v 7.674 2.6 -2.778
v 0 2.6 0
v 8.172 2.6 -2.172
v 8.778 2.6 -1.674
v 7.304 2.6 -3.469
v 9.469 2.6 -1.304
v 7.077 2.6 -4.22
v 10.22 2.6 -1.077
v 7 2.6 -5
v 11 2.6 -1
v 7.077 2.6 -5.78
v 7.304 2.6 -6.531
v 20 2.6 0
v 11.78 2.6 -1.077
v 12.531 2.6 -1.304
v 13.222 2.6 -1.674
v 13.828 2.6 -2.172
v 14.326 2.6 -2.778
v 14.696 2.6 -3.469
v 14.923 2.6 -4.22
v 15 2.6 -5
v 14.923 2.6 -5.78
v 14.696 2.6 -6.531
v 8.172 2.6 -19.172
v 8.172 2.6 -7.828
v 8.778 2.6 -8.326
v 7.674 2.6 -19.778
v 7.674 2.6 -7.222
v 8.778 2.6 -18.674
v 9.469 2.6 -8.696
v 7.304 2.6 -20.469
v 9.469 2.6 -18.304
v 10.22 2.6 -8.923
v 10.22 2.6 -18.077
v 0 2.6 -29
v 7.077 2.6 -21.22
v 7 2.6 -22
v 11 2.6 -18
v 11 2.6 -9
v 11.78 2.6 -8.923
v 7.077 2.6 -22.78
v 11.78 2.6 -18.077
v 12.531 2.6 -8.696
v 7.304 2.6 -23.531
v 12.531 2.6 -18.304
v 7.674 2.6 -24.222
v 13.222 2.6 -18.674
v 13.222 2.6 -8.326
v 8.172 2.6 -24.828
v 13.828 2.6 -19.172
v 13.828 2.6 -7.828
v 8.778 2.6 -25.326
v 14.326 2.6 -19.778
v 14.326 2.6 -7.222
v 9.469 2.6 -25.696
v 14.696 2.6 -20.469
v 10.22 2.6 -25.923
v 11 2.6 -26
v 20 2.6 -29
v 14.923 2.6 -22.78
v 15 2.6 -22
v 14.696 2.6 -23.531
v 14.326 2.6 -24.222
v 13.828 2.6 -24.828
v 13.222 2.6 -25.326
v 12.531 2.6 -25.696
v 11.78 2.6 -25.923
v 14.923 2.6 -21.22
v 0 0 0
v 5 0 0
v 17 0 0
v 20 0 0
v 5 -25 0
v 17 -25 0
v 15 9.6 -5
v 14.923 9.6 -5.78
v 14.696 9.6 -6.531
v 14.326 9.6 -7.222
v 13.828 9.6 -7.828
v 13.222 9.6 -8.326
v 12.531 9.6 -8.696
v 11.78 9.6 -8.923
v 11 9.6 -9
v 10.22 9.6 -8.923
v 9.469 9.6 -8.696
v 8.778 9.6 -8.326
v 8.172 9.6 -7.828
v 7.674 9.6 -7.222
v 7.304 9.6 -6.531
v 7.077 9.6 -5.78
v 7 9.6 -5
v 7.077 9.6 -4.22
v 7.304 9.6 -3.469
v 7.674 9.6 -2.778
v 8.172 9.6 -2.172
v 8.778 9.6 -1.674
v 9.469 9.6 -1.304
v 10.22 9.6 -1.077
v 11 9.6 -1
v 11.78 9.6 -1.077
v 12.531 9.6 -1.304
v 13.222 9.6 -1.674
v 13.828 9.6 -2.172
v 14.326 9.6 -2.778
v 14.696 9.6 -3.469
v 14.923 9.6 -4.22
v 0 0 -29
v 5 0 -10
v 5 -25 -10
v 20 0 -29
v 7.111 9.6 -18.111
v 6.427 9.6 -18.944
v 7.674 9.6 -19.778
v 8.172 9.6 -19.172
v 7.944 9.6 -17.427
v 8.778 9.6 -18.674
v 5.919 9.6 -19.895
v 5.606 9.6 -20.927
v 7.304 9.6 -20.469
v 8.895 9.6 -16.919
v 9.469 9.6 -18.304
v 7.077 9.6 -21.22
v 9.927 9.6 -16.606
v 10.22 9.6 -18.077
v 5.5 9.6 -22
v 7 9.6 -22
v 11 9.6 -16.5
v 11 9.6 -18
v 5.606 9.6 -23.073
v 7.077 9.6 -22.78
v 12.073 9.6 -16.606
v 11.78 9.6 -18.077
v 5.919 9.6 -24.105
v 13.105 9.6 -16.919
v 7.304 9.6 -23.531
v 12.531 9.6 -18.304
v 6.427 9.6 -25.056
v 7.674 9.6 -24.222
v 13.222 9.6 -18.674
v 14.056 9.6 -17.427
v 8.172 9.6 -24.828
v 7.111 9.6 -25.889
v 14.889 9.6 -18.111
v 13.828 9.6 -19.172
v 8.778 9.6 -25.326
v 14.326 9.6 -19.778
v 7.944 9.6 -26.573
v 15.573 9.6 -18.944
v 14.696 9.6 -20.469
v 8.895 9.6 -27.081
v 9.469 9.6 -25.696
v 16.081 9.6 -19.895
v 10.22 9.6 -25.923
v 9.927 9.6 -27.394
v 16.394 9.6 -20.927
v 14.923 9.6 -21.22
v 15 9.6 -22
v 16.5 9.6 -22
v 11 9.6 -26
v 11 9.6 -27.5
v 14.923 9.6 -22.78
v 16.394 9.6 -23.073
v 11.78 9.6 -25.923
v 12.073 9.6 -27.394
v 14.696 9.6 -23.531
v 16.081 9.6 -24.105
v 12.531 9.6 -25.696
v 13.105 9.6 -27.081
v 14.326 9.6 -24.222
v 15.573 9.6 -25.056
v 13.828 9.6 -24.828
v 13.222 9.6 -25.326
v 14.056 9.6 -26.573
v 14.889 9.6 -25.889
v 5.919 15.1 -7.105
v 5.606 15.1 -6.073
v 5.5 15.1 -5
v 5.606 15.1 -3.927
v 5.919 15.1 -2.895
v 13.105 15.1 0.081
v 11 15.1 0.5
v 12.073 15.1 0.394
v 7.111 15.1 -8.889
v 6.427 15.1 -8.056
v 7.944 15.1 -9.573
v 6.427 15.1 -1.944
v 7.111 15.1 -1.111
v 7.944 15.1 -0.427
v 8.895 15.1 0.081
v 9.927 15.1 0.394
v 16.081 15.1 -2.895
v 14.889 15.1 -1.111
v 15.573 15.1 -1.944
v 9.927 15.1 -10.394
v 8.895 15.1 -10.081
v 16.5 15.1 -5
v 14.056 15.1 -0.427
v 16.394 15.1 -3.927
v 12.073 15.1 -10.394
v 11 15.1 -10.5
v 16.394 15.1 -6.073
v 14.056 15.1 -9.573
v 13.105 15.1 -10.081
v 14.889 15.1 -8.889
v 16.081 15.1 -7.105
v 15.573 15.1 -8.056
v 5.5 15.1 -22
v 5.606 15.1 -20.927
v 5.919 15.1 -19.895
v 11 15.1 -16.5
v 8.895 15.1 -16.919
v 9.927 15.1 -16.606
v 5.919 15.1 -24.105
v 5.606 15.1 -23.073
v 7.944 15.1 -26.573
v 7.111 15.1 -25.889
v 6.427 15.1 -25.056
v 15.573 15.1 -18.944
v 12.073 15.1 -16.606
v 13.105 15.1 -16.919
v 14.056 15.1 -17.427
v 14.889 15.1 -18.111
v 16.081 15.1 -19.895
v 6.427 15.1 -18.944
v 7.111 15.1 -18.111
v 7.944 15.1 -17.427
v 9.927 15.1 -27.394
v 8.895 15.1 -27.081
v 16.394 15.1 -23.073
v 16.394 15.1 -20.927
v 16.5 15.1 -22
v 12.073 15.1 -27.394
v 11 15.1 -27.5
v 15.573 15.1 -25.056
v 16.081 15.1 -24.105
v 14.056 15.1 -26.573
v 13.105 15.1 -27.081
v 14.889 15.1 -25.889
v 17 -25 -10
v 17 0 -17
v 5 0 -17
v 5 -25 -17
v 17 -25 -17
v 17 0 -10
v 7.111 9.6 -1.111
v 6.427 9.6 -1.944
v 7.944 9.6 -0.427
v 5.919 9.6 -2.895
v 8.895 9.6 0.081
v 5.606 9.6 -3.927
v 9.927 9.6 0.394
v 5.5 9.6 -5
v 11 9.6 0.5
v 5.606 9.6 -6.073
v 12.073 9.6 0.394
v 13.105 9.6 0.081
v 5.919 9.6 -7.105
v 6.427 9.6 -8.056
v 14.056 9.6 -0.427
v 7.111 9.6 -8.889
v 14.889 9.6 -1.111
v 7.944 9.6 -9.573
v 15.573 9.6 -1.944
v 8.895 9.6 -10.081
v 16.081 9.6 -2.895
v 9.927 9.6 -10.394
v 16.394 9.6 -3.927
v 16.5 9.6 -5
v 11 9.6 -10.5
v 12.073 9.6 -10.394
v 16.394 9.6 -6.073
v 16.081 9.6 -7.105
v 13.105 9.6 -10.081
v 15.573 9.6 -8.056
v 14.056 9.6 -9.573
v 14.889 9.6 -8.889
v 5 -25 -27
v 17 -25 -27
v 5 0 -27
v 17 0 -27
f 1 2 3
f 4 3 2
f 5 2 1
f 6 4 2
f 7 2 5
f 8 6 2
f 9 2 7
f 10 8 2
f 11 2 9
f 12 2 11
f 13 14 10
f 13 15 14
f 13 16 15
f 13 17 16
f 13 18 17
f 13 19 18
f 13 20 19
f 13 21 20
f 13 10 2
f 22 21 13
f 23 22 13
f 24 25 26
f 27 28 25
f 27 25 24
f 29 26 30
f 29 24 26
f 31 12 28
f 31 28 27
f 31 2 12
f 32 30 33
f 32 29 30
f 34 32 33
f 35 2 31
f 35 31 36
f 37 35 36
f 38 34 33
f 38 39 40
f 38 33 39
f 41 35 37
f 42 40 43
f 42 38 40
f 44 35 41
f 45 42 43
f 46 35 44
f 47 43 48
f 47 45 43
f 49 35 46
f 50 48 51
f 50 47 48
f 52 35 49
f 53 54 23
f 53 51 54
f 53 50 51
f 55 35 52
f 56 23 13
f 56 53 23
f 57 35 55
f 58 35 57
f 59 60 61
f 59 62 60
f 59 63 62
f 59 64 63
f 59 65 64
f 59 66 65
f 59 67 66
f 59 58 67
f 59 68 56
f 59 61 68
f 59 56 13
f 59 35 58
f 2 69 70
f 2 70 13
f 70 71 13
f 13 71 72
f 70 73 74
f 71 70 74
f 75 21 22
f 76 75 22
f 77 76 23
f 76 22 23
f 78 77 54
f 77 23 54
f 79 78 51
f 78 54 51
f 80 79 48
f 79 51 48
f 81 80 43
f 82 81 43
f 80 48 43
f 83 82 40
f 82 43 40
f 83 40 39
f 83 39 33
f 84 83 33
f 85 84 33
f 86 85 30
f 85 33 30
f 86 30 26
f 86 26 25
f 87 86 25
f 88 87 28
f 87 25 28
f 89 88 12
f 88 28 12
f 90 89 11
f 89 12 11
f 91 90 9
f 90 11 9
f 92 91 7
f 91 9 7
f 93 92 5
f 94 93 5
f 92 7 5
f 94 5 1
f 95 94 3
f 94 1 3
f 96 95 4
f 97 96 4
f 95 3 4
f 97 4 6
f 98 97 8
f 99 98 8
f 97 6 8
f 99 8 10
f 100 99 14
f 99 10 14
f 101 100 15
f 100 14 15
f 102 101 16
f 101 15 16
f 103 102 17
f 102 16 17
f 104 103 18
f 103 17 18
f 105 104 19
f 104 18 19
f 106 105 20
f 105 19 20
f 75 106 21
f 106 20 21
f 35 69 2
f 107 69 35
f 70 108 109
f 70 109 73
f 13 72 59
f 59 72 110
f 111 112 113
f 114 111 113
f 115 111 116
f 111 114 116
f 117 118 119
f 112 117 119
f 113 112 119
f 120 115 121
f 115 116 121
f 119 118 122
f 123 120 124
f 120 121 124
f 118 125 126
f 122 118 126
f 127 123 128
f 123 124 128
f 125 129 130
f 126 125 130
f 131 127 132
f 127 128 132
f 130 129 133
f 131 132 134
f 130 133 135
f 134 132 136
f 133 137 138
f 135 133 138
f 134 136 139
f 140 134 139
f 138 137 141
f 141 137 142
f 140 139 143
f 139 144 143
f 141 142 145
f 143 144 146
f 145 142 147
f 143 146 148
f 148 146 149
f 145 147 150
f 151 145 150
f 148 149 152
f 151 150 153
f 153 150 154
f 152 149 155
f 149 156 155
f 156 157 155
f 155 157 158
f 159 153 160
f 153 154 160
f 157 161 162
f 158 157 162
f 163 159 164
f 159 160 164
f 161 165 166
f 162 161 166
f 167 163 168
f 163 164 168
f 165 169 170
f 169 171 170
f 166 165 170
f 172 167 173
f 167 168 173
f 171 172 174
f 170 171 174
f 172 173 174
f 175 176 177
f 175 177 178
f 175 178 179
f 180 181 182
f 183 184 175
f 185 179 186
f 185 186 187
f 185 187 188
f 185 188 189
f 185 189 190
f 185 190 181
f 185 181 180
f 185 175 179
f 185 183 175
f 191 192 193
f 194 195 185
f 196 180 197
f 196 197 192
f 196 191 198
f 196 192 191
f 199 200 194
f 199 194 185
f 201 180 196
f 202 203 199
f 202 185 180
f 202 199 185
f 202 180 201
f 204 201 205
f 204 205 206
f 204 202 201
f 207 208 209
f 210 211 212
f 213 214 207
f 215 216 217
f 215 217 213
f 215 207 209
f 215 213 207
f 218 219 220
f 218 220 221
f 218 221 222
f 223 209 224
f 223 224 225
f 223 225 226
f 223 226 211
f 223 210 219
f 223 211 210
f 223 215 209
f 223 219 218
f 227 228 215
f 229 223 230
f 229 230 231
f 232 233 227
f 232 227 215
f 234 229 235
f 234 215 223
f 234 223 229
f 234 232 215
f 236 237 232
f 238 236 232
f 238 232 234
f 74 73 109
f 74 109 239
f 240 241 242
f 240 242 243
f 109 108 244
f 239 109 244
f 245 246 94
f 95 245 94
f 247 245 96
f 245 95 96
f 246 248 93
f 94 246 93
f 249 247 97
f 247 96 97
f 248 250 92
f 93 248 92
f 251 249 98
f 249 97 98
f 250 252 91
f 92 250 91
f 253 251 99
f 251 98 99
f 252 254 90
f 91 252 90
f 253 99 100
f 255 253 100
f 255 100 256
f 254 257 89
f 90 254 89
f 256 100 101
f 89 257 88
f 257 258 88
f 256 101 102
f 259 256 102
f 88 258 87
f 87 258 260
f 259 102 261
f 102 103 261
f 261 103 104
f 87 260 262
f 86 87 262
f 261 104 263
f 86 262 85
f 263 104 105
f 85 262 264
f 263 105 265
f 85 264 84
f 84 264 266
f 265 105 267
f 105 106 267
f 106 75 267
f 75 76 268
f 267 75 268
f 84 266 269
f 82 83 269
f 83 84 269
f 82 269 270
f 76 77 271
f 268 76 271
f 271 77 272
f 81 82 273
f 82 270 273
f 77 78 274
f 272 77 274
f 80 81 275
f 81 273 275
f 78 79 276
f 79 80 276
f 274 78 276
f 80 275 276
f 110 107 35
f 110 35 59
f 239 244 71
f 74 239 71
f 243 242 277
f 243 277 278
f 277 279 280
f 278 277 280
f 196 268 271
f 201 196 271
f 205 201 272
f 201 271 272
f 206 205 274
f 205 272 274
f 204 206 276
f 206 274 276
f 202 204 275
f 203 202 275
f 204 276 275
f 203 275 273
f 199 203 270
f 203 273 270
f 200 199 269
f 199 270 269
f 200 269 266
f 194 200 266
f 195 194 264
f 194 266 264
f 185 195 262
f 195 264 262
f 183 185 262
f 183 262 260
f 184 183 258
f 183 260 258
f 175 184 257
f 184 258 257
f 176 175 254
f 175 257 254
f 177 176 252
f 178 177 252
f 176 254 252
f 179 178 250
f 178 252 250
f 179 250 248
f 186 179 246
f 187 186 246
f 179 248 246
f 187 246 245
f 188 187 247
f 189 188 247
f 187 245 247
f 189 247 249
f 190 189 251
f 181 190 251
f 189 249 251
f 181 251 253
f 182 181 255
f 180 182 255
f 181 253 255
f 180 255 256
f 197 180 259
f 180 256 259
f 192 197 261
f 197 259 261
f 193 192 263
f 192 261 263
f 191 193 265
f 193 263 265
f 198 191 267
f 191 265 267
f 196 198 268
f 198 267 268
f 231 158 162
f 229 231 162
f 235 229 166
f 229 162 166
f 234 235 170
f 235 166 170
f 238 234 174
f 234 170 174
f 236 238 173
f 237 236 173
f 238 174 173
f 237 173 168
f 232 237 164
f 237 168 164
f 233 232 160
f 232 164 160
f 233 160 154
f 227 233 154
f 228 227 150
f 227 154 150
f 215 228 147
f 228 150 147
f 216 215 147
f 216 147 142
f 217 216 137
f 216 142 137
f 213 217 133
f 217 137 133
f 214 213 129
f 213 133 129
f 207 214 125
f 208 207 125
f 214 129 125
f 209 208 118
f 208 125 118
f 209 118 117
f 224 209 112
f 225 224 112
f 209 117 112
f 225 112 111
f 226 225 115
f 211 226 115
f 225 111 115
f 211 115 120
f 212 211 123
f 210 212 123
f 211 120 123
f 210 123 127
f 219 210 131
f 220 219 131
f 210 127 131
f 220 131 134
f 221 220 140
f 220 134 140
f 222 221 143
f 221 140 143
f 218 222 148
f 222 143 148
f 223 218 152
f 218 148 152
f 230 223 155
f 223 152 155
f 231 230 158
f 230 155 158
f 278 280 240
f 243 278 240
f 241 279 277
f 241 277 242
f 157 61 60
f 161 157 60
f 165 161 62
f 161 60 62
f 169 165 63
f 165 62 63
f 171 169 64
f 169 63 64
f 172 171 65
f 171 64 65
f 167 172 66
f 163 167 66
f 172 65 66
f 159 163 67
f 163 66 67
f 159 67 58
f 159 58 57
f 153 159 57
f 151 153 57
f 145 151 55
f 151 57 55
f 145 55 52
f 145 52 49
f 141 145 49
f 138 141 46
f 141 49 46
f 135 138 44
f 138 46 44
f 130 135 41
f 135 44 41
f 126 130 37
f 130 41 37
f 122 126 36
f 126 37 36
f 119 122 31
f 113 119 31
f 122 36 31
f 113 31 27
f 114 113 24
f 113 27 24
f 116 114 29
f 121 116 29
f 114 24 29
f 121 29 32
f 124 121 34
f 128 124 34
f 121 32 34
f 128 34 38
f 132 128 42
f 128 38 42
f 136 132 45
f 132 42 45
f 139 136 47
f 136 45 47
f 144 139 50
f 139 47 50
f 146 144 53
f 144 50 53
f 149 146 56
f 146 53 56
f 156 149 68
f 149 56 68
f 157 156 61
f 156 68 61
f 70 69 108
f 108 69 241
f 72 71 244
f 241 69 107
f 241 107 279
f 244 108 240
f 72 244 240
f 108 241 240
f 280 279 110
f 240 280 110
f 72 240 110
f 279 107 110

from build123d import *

# Parameters (mm, degrees)
SKICA1_W                = 20
SKICA1_H                = 29
P_IDAT_VYSUNUT_M1_DEPTH = 2.6
SKICA2_R                = 4
P_IDAT_VYSUNUT_M2_DEPTH = 7
SKICA3_R                = 5.5
P_IDAT_VYSUNUT_M3_DEPTH = 5.5
SKICA5_W                = 12
SKICA5_H                = 10
P_IDAT_VYSUNUT_M4_DEPTH = 25


with BuildPart() as part:
    # Skica1 → Přidat vysunutím1 (new body)
    with BuildSketch(Plane(origin=(0, 0, 0), x_dir=(1, 0, 0), z_dir=(0, 1, 0))):
        with Locations((10, 14.5)):
            Rectangle(SKICA1_W, SKICA1_H)
    extrude(amount=P_IDAT_VYSUNUT_M1_DEPTH)

    # Skica2 → Přidat vysunutím2 (add)
    with BuildSketch(Plane(origin=(0, 2.6, 0), x_dir=(1, 0, 0), z_dir=(0, 1, 0))):
        with Locations((11, 5)):
            Circle(SKICA2_R)
        with Locations((11, 22)):
            Circle(SKICA2_R)
    extrude(amount=P_IDAT_VYSUNUT_M2_DEPTH)

    # Skica3 → Přidat vysunutím3 (add)
    with BuildSketch(Plane(origin=(0, 9.6, 0), x_dir=(1, 0, 0), z_dir=(0, 1, 0))):
        with Locations((11, 22)):
            Circle(SKICA3_R)
        with Locations((11, 5)):
            Circle(SKICA3_R)
    extrude(amount=P_IDAT_VYSUNUT_M3_DEPTH)

    # Skica5 → Přidat vysunutím4 (add)
    with BuildSketch(Plane.XZ):
        with Locations((11, -22)):
            Rectangle(SKICA5_W, SKICA5_H)
        with Locations((11, -5)):
            Rectangle(SKICA5_W, SKICA5_H)
    extrude(amount=P_IDAT_VYSUNUT_M4_DEPTH)


solid = part.part
